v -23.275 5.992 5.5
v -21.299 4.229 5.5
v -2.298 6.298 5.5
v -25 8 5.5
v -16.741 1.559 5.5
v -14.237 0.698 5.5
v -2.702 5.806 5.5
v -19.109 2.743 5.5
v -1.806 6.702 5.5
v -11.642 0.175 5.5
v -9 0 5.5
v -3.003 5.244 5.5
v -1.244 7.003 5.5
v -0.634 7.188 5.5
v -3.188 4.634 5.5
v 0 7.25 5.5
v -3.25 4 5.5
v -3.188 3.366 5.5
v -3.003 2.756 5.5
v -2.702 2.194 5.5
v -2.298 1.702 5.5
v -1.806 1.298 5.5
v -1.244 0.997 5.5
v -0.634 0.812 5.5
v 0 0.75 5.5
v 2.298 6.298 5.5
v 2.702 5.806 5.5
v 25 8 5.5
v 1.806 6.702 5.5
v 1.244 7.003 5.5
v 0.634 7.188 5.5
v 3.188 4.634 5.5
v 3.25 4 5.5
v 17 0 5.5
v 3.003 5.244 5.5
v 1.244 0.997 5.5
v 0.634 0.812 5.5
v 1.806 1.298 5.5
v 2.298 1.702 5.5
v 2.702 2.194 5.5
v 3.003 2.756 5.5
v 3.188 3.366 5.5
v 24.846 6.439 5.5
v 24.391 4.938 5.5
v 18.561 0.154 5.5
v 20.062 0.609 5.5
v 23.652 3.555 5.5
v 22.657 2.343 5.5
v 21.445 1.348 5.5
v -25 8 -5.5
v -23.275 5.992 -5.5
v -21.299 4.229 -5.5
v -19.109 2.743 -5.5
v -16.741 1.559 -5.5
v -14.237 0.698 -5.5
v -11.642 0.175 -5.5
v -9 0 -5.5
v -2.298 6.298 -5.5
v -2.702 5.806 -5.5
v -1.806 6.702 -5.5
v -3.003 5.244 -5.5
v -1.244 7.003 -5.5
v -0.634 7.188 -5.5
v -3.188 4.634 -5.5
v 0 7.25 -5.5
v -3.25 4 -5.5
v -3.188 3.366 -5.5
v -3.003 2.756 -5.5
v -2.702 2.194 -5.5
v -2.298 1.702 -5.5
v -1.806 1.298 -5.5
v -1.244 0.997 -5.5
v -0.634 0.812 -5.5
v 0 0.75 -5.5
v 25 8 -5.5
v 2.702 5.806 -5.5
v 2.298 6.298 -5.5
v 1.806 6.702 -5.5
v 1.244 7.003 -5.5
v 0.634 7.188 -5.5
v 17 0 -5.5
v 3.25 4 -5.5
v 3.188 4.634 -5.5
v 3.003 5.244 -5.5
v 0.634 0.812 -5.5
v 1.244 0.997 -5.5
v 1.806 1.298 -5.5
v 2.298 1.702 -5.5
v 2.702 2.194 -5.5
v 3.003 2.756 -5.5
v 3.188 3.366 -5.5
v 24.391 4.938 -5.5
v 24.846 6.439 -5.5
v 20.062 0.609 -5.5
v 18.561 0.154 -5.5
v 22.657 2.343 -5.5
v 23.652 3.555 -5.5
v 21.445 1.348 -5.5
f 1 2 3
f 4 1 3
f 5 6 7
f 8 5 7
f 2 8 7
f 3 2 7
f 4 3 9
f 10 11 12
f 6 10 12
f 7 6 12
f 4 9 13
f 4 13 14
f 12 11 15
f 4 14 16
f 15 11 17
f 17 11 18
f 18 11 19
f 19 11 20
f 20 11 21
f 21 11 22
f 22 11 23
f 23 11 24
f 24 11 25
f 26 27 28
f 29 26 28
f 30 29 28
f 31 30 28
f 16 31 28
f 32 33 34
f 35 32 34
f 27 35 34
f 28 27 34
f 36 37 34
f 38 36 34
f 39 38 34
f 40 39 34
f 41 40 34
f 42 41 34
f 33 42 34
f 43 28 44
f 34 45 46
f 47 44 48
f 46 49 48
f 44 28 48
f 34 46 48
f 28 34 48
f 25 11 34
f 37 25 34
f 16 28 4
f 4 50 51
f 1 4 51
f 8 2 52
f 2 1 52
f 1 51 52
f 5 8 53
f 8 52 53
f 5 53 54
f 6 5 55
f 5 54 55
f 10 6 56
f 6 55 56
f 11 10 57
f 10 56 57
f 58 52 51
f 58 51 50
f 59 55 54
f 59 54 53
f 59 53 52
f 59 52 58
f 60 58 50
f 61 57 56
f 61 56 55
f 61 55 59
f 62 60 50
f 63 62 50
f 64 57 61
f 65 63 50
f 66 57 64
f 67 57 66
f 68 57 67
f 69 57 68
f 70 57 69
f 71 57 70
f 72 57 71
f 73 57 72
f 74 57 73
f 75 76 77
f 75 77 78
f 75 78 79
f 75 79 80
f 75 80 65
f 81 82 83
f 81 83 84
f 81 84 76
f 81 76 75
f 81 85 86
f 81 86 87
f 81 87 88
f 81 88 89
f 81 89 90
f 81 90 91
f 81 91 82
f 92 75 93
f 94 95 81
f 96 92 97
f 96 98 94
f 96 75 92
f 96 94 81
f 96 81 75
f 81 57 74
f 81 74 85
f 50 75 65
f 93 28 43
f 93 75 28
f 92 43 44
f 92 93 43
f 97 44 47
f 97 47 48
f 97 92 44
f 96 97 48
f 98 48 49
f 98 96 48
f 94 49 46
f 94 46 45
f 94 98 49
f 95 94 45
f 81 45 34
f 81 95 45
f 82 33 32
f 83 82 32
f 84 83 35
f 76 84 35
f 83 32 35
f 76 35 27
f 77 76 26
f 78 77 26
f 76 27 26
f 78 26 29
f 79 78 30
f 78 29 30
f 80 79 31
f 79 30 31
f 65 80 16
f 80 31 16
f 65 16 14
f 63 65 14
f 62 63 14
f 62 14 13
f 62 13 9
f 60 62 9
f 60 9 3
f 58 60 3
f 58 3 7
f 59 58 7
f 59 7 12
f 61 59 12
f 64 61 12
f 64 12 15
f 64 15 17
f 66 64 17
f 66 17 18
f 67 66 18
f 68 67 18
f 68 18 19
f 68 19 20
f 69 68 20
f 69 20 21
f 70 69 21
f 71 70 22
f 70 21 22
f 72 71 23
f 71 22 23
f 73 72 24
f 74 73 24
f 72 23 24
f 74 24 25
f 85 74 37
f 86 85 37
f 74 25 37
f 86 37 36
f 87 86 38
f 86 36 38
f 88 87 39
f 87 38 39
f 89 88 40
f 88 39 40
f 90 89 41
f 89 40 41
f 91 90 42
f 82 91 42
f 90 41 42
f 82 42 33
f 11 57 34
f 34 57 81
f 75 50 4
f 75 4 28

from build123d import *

# Parameters (mm, degrees)
SKETCH1_W           = 50
SKETCH1_H           = 11
BOSS_EXTRUDE1_DEPTH = 8
FILLET1_R           = 20
FILLET2_R           = 8
SKETCH2_R           = 3.25
CUT_EXTRUDE1_DEPTH  = 21


# Some blends are built 0.0001 mm under size
with BuildPart() as part:
    # Sketch1 → Boss-Extrude1 (new body)
    with BuildSketch(Plane(origin=(0, 0, 0), x_dir=(1, 0, 0), z_dir=(0, 1, 0))):
        Rectangle(SKETCH1_W, SKETCH1_H)
    extrude(amount=BOSS_EXTRUDE1_DEPTH)

    # Fillet1
    # the kernel refuses this fillet: 20 mm, written as the material it takes off along each edge
    with BuildSketch(Plane(origin=(-25, 0, -45.5), x_dir=(0, 1, 0), z_dir=(0, 0, 1))) as fillet1_piece_1:
        with BuildLine():
            CenterArc((20, -16), FILLET1_R, 126.869897646, 53.130102354)
            Line((0, -16), (-0.4, -16))
            Line((-0.4, -16), (-0.4, 0))
            Line((-0.4, 0), (0, 0.4))
            ThreePointArc((0, 0.4), (4, 0.4), (7.76, 0.32))
            Line((7.76, 0.32), (8, 0))
        make_face()
    extrude(amount=91, mode=Mode.SUBTRACT)

    # Fillet2
    fillet2_edges = [part.edges().sort_by_distance(p)[0] for p in [
        (25, 0, 0),
    ]]
    fillet(fillet2_edges, radius=FILLET2_R - 0.0001)  # a hair under: the kernel refuses the full size

    # Sketch2 → Cut-Extrude1 (cut)
    with BuildSketch(Plane.XY.offset(5.5)):
        with Locations((0, 4)):
            Circle(SKETCH2_R)
    extrude(amount=-CUT_EXTRUDE1_DEPTH, mode=Mode.SUBTRACT)


solid = part.part
